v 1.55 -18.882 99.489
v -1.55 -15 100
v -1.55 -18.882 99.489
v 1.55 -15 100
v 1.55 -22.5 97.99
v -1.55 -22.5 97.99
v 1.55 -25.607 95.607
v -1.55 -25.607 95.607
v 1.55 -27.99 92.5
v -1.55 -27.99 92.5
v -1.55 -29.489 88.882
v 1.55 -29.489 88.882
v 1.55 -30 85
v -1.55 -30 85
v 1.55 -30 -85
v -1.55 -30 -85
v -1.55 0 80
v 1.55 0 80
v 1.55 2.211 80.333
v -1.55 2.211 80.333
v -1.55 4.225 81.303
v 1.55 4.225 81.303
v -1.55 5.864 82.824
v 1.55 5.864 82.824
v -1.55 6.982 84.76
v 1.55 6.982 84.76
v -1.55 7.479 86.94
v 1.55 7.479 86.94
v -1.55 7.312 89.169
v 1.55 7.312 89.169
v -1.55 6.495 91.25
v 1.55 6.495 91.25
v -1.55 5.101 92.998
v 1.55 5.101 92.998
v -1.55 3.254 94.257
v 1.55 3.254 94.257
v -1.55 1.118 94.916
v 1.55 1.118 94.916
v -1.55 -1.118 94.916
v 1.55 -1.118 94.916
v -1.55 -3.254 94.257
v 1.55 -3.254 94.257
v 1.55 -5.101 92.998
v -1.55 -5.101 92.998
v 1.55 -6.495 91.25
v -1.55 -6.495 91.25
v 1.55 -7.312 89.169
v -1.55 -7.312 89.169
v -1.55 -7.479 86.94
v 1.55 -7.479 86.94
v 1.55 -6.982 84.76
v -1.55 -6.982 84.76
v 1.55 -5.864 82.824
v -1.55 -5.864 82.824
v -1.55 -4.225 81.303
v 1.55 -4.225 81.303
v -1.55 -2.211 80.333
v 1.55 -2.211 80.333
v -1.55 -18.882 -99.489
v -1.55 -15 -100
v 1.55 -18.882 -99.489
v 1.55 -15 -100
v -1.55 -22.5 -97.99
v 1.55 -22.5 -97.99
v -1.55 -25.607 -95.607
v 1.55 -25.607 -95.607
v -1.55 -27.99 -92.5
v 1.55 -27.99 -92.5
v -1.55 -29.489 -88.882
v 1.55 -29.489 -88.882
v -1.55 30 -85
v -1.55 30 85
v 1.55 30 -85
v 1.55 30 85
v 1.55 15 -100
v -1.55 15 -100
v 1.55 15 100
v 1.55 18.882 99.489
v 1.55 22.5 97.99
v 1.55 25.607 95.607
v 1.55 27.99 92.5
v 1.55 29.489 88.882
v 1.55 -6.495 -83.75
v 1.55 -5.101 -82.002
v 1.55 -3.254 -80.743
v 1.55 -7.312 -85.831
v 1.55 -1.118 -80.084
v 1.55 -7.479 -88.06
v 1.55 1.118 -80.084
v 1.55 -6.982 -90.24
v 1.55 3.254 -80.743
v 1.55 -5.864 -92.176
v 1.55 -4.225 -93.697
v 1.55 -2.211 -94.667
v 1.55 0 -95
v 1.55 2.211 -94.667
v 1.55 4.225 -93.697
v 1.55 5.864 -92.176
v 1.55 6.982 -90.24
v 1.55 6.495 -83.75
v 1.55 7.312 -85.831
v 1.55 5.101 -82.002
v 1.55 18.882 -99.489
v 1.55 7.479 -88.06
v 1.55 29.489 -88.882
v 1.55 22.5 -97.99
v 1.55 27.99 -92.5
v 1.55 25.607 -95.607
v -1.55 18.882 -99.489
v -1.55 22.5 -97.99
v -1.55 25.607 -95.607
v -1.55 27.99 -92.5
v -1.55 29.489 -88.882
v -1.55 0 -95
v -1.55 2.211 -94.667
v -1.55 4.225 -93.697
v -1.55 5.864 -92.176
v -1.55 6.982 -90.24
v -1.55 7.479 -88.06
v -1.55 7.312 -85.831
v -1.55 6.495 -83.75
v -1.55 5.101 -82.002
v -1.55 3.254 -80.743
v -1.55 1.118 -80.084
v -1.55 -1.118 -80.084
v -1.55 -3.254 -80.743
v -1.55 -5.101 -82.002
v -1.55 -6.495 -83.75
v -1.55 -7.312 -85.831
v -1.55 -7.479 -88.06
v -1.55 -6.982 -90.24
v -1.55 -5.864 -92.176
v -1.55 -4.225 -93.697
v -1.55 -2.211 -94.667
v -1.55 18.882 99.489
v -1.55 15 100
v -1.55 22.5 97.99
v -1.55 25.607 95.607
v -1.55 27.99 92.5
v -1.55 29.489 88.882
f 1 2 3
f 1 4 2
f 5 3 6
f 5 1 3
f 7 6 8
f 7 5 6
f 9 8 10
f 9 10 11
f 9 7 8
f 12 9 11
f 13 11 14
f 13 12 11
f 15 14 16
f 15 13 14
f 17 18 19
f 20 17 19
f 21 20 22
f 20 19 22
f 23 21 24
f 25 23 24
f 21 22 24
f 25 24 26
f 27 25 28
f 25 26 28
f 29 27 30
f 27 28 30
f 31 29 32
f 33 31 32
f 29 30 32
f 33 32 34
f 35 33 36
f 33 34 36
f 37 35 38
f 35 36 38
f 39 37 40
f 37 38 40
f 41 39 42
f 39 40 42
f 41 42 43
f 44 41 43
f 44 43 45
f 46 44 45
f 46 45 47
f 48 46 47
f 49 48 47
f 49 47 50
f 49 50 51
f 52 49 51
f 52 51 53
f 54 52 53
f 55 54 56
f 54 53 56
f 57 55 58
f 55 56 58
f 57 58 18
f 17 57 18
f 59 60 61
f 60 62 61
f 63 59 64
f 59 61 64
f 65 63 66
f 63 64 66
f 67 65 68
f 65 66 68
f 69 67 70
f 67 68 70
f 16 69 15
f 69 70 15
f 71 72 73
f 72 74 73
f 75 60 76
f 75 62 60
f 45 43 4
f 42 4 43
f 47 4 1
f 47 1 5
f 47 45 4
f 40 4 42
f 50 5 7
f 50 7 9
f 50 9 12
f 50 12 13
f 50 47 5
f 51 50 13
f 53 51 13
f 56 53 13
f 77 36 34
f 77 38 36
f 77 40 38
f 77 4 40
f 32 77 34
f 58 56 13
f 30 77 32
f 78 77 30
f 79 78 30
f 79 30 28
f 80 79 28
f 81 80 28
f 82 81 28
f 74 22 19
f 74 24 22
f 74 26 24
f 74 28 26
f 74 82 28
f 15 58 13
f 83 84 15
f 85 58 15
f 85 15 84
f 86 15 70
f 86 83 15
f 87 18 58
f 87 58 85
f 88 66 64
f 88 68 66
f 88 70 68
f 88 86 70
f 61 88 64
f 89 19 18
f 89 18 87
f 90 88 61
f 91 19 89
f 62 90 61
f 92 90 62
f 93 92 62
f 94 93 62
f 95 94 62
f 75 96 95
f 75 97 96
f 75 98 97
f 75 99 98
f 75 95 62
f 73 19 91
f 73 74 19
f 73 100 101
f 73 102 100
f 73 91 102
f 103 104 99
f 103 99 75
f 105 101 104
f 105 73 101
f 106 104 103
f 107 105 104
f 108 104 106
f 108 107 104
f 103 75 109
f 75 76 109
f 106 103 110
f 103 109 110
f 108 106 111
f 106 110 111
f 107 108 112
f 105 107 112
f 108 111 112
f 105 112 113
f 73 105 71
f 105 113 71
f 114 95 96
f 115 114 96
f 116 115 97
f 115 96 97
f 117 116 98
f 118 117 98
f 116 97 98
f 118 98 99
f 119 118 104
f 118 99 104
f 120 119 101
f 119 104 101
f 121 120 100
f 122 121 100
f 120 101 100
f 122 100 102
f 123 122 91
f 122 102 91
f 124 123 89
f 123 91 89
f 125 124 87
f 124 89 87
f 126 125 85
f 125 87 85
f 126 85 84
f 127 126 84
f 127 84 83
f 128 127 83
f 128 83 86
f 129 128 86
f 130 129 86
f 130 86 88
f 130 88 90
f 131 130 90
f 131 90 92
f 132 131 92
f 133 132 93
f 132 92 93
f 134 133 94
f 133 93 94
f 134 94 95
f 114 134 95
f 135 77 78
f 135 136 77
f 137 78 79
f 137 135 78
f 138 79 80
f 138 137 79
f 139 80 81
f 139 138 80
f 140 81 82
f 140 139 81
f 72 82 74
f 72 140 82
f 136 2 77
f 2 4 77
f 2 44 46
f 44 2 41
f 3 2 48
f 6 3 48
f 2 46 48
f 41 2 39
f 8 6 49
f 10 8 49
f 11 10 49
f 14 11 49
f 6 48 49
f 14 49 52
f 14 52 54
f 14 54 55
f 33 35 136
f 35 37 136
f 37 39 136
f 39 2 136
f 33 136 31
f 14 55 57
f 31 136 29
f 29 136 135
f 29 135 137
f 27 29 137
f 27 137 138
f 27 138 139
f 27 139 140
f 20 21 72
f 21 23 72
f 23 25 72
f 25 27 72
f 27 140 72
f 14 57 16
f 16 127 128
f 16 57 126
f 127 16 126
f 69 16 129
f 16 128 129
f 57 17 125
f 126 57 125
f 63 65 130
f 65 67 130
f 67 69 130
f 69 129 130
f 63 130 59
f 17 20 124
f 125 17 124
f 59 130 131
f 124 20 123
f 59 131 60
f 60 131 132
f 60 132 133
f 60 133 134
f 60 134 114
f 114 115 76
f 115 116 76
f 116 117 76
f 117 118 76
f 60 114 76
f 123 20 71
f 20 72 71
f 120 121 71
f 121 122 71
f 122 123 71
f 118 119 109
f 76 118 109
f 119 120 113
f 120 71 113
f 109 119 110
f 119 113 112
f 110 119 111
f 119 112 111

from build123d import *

# Parameters (mm, degrees)
CROQUIS1_W              = 200
CROQUIS1_H              = 60
SALIENTE_EXTRUIR1_DEPTH = 1.55
REDONDEO1_R             = 15
CROQUIS2_R              = 7.5
CORTAR_EXTRUIR1_DEPTH   = 3.1


with BuildPart() as part:
    # Croquis1 → Saliente-Extruir1 (new body, symmetric)
    with BuildSketch(Plane(origin=(0, 0, 0), x_dir=(0, 0, -1), z_dir=(1, 0, 0))):
        Rectangle(CROQUIS1_W, CROQUIS1_H)
    extrude(amount=SALIENTE_EXTRUIR1_DEPTH, both=True)

    # Redondeo1
    redondeo1_edges = [part.edges().sort_by_distance(p)[0] for p in [
        (0, -30, -100),
        (0, -30, 100),
        (0, 30, 100),
        (0, 30, -100),
    ]]
    fillet(redondeo1_edges, radius=REDONDEO1_R)

    # Croquis2 → Cortar-Extruir1 (cut)
    with BuildSketch(Plane(origin=(1.55, 0, 0), x_dir=(0, 0, -1), z_dir=(1, 0, 0))):
        with Locations((-87.5, 0)):
            Circle(CROQUIS2_R)
        with Locations((87.5, 0)):
            Circle(CROQUIS2_R)
    extrude(amount=-CORTAR_EXTRUIR1_DEPTH, mode=Mode.SUBTRACT)


solid = part.part
